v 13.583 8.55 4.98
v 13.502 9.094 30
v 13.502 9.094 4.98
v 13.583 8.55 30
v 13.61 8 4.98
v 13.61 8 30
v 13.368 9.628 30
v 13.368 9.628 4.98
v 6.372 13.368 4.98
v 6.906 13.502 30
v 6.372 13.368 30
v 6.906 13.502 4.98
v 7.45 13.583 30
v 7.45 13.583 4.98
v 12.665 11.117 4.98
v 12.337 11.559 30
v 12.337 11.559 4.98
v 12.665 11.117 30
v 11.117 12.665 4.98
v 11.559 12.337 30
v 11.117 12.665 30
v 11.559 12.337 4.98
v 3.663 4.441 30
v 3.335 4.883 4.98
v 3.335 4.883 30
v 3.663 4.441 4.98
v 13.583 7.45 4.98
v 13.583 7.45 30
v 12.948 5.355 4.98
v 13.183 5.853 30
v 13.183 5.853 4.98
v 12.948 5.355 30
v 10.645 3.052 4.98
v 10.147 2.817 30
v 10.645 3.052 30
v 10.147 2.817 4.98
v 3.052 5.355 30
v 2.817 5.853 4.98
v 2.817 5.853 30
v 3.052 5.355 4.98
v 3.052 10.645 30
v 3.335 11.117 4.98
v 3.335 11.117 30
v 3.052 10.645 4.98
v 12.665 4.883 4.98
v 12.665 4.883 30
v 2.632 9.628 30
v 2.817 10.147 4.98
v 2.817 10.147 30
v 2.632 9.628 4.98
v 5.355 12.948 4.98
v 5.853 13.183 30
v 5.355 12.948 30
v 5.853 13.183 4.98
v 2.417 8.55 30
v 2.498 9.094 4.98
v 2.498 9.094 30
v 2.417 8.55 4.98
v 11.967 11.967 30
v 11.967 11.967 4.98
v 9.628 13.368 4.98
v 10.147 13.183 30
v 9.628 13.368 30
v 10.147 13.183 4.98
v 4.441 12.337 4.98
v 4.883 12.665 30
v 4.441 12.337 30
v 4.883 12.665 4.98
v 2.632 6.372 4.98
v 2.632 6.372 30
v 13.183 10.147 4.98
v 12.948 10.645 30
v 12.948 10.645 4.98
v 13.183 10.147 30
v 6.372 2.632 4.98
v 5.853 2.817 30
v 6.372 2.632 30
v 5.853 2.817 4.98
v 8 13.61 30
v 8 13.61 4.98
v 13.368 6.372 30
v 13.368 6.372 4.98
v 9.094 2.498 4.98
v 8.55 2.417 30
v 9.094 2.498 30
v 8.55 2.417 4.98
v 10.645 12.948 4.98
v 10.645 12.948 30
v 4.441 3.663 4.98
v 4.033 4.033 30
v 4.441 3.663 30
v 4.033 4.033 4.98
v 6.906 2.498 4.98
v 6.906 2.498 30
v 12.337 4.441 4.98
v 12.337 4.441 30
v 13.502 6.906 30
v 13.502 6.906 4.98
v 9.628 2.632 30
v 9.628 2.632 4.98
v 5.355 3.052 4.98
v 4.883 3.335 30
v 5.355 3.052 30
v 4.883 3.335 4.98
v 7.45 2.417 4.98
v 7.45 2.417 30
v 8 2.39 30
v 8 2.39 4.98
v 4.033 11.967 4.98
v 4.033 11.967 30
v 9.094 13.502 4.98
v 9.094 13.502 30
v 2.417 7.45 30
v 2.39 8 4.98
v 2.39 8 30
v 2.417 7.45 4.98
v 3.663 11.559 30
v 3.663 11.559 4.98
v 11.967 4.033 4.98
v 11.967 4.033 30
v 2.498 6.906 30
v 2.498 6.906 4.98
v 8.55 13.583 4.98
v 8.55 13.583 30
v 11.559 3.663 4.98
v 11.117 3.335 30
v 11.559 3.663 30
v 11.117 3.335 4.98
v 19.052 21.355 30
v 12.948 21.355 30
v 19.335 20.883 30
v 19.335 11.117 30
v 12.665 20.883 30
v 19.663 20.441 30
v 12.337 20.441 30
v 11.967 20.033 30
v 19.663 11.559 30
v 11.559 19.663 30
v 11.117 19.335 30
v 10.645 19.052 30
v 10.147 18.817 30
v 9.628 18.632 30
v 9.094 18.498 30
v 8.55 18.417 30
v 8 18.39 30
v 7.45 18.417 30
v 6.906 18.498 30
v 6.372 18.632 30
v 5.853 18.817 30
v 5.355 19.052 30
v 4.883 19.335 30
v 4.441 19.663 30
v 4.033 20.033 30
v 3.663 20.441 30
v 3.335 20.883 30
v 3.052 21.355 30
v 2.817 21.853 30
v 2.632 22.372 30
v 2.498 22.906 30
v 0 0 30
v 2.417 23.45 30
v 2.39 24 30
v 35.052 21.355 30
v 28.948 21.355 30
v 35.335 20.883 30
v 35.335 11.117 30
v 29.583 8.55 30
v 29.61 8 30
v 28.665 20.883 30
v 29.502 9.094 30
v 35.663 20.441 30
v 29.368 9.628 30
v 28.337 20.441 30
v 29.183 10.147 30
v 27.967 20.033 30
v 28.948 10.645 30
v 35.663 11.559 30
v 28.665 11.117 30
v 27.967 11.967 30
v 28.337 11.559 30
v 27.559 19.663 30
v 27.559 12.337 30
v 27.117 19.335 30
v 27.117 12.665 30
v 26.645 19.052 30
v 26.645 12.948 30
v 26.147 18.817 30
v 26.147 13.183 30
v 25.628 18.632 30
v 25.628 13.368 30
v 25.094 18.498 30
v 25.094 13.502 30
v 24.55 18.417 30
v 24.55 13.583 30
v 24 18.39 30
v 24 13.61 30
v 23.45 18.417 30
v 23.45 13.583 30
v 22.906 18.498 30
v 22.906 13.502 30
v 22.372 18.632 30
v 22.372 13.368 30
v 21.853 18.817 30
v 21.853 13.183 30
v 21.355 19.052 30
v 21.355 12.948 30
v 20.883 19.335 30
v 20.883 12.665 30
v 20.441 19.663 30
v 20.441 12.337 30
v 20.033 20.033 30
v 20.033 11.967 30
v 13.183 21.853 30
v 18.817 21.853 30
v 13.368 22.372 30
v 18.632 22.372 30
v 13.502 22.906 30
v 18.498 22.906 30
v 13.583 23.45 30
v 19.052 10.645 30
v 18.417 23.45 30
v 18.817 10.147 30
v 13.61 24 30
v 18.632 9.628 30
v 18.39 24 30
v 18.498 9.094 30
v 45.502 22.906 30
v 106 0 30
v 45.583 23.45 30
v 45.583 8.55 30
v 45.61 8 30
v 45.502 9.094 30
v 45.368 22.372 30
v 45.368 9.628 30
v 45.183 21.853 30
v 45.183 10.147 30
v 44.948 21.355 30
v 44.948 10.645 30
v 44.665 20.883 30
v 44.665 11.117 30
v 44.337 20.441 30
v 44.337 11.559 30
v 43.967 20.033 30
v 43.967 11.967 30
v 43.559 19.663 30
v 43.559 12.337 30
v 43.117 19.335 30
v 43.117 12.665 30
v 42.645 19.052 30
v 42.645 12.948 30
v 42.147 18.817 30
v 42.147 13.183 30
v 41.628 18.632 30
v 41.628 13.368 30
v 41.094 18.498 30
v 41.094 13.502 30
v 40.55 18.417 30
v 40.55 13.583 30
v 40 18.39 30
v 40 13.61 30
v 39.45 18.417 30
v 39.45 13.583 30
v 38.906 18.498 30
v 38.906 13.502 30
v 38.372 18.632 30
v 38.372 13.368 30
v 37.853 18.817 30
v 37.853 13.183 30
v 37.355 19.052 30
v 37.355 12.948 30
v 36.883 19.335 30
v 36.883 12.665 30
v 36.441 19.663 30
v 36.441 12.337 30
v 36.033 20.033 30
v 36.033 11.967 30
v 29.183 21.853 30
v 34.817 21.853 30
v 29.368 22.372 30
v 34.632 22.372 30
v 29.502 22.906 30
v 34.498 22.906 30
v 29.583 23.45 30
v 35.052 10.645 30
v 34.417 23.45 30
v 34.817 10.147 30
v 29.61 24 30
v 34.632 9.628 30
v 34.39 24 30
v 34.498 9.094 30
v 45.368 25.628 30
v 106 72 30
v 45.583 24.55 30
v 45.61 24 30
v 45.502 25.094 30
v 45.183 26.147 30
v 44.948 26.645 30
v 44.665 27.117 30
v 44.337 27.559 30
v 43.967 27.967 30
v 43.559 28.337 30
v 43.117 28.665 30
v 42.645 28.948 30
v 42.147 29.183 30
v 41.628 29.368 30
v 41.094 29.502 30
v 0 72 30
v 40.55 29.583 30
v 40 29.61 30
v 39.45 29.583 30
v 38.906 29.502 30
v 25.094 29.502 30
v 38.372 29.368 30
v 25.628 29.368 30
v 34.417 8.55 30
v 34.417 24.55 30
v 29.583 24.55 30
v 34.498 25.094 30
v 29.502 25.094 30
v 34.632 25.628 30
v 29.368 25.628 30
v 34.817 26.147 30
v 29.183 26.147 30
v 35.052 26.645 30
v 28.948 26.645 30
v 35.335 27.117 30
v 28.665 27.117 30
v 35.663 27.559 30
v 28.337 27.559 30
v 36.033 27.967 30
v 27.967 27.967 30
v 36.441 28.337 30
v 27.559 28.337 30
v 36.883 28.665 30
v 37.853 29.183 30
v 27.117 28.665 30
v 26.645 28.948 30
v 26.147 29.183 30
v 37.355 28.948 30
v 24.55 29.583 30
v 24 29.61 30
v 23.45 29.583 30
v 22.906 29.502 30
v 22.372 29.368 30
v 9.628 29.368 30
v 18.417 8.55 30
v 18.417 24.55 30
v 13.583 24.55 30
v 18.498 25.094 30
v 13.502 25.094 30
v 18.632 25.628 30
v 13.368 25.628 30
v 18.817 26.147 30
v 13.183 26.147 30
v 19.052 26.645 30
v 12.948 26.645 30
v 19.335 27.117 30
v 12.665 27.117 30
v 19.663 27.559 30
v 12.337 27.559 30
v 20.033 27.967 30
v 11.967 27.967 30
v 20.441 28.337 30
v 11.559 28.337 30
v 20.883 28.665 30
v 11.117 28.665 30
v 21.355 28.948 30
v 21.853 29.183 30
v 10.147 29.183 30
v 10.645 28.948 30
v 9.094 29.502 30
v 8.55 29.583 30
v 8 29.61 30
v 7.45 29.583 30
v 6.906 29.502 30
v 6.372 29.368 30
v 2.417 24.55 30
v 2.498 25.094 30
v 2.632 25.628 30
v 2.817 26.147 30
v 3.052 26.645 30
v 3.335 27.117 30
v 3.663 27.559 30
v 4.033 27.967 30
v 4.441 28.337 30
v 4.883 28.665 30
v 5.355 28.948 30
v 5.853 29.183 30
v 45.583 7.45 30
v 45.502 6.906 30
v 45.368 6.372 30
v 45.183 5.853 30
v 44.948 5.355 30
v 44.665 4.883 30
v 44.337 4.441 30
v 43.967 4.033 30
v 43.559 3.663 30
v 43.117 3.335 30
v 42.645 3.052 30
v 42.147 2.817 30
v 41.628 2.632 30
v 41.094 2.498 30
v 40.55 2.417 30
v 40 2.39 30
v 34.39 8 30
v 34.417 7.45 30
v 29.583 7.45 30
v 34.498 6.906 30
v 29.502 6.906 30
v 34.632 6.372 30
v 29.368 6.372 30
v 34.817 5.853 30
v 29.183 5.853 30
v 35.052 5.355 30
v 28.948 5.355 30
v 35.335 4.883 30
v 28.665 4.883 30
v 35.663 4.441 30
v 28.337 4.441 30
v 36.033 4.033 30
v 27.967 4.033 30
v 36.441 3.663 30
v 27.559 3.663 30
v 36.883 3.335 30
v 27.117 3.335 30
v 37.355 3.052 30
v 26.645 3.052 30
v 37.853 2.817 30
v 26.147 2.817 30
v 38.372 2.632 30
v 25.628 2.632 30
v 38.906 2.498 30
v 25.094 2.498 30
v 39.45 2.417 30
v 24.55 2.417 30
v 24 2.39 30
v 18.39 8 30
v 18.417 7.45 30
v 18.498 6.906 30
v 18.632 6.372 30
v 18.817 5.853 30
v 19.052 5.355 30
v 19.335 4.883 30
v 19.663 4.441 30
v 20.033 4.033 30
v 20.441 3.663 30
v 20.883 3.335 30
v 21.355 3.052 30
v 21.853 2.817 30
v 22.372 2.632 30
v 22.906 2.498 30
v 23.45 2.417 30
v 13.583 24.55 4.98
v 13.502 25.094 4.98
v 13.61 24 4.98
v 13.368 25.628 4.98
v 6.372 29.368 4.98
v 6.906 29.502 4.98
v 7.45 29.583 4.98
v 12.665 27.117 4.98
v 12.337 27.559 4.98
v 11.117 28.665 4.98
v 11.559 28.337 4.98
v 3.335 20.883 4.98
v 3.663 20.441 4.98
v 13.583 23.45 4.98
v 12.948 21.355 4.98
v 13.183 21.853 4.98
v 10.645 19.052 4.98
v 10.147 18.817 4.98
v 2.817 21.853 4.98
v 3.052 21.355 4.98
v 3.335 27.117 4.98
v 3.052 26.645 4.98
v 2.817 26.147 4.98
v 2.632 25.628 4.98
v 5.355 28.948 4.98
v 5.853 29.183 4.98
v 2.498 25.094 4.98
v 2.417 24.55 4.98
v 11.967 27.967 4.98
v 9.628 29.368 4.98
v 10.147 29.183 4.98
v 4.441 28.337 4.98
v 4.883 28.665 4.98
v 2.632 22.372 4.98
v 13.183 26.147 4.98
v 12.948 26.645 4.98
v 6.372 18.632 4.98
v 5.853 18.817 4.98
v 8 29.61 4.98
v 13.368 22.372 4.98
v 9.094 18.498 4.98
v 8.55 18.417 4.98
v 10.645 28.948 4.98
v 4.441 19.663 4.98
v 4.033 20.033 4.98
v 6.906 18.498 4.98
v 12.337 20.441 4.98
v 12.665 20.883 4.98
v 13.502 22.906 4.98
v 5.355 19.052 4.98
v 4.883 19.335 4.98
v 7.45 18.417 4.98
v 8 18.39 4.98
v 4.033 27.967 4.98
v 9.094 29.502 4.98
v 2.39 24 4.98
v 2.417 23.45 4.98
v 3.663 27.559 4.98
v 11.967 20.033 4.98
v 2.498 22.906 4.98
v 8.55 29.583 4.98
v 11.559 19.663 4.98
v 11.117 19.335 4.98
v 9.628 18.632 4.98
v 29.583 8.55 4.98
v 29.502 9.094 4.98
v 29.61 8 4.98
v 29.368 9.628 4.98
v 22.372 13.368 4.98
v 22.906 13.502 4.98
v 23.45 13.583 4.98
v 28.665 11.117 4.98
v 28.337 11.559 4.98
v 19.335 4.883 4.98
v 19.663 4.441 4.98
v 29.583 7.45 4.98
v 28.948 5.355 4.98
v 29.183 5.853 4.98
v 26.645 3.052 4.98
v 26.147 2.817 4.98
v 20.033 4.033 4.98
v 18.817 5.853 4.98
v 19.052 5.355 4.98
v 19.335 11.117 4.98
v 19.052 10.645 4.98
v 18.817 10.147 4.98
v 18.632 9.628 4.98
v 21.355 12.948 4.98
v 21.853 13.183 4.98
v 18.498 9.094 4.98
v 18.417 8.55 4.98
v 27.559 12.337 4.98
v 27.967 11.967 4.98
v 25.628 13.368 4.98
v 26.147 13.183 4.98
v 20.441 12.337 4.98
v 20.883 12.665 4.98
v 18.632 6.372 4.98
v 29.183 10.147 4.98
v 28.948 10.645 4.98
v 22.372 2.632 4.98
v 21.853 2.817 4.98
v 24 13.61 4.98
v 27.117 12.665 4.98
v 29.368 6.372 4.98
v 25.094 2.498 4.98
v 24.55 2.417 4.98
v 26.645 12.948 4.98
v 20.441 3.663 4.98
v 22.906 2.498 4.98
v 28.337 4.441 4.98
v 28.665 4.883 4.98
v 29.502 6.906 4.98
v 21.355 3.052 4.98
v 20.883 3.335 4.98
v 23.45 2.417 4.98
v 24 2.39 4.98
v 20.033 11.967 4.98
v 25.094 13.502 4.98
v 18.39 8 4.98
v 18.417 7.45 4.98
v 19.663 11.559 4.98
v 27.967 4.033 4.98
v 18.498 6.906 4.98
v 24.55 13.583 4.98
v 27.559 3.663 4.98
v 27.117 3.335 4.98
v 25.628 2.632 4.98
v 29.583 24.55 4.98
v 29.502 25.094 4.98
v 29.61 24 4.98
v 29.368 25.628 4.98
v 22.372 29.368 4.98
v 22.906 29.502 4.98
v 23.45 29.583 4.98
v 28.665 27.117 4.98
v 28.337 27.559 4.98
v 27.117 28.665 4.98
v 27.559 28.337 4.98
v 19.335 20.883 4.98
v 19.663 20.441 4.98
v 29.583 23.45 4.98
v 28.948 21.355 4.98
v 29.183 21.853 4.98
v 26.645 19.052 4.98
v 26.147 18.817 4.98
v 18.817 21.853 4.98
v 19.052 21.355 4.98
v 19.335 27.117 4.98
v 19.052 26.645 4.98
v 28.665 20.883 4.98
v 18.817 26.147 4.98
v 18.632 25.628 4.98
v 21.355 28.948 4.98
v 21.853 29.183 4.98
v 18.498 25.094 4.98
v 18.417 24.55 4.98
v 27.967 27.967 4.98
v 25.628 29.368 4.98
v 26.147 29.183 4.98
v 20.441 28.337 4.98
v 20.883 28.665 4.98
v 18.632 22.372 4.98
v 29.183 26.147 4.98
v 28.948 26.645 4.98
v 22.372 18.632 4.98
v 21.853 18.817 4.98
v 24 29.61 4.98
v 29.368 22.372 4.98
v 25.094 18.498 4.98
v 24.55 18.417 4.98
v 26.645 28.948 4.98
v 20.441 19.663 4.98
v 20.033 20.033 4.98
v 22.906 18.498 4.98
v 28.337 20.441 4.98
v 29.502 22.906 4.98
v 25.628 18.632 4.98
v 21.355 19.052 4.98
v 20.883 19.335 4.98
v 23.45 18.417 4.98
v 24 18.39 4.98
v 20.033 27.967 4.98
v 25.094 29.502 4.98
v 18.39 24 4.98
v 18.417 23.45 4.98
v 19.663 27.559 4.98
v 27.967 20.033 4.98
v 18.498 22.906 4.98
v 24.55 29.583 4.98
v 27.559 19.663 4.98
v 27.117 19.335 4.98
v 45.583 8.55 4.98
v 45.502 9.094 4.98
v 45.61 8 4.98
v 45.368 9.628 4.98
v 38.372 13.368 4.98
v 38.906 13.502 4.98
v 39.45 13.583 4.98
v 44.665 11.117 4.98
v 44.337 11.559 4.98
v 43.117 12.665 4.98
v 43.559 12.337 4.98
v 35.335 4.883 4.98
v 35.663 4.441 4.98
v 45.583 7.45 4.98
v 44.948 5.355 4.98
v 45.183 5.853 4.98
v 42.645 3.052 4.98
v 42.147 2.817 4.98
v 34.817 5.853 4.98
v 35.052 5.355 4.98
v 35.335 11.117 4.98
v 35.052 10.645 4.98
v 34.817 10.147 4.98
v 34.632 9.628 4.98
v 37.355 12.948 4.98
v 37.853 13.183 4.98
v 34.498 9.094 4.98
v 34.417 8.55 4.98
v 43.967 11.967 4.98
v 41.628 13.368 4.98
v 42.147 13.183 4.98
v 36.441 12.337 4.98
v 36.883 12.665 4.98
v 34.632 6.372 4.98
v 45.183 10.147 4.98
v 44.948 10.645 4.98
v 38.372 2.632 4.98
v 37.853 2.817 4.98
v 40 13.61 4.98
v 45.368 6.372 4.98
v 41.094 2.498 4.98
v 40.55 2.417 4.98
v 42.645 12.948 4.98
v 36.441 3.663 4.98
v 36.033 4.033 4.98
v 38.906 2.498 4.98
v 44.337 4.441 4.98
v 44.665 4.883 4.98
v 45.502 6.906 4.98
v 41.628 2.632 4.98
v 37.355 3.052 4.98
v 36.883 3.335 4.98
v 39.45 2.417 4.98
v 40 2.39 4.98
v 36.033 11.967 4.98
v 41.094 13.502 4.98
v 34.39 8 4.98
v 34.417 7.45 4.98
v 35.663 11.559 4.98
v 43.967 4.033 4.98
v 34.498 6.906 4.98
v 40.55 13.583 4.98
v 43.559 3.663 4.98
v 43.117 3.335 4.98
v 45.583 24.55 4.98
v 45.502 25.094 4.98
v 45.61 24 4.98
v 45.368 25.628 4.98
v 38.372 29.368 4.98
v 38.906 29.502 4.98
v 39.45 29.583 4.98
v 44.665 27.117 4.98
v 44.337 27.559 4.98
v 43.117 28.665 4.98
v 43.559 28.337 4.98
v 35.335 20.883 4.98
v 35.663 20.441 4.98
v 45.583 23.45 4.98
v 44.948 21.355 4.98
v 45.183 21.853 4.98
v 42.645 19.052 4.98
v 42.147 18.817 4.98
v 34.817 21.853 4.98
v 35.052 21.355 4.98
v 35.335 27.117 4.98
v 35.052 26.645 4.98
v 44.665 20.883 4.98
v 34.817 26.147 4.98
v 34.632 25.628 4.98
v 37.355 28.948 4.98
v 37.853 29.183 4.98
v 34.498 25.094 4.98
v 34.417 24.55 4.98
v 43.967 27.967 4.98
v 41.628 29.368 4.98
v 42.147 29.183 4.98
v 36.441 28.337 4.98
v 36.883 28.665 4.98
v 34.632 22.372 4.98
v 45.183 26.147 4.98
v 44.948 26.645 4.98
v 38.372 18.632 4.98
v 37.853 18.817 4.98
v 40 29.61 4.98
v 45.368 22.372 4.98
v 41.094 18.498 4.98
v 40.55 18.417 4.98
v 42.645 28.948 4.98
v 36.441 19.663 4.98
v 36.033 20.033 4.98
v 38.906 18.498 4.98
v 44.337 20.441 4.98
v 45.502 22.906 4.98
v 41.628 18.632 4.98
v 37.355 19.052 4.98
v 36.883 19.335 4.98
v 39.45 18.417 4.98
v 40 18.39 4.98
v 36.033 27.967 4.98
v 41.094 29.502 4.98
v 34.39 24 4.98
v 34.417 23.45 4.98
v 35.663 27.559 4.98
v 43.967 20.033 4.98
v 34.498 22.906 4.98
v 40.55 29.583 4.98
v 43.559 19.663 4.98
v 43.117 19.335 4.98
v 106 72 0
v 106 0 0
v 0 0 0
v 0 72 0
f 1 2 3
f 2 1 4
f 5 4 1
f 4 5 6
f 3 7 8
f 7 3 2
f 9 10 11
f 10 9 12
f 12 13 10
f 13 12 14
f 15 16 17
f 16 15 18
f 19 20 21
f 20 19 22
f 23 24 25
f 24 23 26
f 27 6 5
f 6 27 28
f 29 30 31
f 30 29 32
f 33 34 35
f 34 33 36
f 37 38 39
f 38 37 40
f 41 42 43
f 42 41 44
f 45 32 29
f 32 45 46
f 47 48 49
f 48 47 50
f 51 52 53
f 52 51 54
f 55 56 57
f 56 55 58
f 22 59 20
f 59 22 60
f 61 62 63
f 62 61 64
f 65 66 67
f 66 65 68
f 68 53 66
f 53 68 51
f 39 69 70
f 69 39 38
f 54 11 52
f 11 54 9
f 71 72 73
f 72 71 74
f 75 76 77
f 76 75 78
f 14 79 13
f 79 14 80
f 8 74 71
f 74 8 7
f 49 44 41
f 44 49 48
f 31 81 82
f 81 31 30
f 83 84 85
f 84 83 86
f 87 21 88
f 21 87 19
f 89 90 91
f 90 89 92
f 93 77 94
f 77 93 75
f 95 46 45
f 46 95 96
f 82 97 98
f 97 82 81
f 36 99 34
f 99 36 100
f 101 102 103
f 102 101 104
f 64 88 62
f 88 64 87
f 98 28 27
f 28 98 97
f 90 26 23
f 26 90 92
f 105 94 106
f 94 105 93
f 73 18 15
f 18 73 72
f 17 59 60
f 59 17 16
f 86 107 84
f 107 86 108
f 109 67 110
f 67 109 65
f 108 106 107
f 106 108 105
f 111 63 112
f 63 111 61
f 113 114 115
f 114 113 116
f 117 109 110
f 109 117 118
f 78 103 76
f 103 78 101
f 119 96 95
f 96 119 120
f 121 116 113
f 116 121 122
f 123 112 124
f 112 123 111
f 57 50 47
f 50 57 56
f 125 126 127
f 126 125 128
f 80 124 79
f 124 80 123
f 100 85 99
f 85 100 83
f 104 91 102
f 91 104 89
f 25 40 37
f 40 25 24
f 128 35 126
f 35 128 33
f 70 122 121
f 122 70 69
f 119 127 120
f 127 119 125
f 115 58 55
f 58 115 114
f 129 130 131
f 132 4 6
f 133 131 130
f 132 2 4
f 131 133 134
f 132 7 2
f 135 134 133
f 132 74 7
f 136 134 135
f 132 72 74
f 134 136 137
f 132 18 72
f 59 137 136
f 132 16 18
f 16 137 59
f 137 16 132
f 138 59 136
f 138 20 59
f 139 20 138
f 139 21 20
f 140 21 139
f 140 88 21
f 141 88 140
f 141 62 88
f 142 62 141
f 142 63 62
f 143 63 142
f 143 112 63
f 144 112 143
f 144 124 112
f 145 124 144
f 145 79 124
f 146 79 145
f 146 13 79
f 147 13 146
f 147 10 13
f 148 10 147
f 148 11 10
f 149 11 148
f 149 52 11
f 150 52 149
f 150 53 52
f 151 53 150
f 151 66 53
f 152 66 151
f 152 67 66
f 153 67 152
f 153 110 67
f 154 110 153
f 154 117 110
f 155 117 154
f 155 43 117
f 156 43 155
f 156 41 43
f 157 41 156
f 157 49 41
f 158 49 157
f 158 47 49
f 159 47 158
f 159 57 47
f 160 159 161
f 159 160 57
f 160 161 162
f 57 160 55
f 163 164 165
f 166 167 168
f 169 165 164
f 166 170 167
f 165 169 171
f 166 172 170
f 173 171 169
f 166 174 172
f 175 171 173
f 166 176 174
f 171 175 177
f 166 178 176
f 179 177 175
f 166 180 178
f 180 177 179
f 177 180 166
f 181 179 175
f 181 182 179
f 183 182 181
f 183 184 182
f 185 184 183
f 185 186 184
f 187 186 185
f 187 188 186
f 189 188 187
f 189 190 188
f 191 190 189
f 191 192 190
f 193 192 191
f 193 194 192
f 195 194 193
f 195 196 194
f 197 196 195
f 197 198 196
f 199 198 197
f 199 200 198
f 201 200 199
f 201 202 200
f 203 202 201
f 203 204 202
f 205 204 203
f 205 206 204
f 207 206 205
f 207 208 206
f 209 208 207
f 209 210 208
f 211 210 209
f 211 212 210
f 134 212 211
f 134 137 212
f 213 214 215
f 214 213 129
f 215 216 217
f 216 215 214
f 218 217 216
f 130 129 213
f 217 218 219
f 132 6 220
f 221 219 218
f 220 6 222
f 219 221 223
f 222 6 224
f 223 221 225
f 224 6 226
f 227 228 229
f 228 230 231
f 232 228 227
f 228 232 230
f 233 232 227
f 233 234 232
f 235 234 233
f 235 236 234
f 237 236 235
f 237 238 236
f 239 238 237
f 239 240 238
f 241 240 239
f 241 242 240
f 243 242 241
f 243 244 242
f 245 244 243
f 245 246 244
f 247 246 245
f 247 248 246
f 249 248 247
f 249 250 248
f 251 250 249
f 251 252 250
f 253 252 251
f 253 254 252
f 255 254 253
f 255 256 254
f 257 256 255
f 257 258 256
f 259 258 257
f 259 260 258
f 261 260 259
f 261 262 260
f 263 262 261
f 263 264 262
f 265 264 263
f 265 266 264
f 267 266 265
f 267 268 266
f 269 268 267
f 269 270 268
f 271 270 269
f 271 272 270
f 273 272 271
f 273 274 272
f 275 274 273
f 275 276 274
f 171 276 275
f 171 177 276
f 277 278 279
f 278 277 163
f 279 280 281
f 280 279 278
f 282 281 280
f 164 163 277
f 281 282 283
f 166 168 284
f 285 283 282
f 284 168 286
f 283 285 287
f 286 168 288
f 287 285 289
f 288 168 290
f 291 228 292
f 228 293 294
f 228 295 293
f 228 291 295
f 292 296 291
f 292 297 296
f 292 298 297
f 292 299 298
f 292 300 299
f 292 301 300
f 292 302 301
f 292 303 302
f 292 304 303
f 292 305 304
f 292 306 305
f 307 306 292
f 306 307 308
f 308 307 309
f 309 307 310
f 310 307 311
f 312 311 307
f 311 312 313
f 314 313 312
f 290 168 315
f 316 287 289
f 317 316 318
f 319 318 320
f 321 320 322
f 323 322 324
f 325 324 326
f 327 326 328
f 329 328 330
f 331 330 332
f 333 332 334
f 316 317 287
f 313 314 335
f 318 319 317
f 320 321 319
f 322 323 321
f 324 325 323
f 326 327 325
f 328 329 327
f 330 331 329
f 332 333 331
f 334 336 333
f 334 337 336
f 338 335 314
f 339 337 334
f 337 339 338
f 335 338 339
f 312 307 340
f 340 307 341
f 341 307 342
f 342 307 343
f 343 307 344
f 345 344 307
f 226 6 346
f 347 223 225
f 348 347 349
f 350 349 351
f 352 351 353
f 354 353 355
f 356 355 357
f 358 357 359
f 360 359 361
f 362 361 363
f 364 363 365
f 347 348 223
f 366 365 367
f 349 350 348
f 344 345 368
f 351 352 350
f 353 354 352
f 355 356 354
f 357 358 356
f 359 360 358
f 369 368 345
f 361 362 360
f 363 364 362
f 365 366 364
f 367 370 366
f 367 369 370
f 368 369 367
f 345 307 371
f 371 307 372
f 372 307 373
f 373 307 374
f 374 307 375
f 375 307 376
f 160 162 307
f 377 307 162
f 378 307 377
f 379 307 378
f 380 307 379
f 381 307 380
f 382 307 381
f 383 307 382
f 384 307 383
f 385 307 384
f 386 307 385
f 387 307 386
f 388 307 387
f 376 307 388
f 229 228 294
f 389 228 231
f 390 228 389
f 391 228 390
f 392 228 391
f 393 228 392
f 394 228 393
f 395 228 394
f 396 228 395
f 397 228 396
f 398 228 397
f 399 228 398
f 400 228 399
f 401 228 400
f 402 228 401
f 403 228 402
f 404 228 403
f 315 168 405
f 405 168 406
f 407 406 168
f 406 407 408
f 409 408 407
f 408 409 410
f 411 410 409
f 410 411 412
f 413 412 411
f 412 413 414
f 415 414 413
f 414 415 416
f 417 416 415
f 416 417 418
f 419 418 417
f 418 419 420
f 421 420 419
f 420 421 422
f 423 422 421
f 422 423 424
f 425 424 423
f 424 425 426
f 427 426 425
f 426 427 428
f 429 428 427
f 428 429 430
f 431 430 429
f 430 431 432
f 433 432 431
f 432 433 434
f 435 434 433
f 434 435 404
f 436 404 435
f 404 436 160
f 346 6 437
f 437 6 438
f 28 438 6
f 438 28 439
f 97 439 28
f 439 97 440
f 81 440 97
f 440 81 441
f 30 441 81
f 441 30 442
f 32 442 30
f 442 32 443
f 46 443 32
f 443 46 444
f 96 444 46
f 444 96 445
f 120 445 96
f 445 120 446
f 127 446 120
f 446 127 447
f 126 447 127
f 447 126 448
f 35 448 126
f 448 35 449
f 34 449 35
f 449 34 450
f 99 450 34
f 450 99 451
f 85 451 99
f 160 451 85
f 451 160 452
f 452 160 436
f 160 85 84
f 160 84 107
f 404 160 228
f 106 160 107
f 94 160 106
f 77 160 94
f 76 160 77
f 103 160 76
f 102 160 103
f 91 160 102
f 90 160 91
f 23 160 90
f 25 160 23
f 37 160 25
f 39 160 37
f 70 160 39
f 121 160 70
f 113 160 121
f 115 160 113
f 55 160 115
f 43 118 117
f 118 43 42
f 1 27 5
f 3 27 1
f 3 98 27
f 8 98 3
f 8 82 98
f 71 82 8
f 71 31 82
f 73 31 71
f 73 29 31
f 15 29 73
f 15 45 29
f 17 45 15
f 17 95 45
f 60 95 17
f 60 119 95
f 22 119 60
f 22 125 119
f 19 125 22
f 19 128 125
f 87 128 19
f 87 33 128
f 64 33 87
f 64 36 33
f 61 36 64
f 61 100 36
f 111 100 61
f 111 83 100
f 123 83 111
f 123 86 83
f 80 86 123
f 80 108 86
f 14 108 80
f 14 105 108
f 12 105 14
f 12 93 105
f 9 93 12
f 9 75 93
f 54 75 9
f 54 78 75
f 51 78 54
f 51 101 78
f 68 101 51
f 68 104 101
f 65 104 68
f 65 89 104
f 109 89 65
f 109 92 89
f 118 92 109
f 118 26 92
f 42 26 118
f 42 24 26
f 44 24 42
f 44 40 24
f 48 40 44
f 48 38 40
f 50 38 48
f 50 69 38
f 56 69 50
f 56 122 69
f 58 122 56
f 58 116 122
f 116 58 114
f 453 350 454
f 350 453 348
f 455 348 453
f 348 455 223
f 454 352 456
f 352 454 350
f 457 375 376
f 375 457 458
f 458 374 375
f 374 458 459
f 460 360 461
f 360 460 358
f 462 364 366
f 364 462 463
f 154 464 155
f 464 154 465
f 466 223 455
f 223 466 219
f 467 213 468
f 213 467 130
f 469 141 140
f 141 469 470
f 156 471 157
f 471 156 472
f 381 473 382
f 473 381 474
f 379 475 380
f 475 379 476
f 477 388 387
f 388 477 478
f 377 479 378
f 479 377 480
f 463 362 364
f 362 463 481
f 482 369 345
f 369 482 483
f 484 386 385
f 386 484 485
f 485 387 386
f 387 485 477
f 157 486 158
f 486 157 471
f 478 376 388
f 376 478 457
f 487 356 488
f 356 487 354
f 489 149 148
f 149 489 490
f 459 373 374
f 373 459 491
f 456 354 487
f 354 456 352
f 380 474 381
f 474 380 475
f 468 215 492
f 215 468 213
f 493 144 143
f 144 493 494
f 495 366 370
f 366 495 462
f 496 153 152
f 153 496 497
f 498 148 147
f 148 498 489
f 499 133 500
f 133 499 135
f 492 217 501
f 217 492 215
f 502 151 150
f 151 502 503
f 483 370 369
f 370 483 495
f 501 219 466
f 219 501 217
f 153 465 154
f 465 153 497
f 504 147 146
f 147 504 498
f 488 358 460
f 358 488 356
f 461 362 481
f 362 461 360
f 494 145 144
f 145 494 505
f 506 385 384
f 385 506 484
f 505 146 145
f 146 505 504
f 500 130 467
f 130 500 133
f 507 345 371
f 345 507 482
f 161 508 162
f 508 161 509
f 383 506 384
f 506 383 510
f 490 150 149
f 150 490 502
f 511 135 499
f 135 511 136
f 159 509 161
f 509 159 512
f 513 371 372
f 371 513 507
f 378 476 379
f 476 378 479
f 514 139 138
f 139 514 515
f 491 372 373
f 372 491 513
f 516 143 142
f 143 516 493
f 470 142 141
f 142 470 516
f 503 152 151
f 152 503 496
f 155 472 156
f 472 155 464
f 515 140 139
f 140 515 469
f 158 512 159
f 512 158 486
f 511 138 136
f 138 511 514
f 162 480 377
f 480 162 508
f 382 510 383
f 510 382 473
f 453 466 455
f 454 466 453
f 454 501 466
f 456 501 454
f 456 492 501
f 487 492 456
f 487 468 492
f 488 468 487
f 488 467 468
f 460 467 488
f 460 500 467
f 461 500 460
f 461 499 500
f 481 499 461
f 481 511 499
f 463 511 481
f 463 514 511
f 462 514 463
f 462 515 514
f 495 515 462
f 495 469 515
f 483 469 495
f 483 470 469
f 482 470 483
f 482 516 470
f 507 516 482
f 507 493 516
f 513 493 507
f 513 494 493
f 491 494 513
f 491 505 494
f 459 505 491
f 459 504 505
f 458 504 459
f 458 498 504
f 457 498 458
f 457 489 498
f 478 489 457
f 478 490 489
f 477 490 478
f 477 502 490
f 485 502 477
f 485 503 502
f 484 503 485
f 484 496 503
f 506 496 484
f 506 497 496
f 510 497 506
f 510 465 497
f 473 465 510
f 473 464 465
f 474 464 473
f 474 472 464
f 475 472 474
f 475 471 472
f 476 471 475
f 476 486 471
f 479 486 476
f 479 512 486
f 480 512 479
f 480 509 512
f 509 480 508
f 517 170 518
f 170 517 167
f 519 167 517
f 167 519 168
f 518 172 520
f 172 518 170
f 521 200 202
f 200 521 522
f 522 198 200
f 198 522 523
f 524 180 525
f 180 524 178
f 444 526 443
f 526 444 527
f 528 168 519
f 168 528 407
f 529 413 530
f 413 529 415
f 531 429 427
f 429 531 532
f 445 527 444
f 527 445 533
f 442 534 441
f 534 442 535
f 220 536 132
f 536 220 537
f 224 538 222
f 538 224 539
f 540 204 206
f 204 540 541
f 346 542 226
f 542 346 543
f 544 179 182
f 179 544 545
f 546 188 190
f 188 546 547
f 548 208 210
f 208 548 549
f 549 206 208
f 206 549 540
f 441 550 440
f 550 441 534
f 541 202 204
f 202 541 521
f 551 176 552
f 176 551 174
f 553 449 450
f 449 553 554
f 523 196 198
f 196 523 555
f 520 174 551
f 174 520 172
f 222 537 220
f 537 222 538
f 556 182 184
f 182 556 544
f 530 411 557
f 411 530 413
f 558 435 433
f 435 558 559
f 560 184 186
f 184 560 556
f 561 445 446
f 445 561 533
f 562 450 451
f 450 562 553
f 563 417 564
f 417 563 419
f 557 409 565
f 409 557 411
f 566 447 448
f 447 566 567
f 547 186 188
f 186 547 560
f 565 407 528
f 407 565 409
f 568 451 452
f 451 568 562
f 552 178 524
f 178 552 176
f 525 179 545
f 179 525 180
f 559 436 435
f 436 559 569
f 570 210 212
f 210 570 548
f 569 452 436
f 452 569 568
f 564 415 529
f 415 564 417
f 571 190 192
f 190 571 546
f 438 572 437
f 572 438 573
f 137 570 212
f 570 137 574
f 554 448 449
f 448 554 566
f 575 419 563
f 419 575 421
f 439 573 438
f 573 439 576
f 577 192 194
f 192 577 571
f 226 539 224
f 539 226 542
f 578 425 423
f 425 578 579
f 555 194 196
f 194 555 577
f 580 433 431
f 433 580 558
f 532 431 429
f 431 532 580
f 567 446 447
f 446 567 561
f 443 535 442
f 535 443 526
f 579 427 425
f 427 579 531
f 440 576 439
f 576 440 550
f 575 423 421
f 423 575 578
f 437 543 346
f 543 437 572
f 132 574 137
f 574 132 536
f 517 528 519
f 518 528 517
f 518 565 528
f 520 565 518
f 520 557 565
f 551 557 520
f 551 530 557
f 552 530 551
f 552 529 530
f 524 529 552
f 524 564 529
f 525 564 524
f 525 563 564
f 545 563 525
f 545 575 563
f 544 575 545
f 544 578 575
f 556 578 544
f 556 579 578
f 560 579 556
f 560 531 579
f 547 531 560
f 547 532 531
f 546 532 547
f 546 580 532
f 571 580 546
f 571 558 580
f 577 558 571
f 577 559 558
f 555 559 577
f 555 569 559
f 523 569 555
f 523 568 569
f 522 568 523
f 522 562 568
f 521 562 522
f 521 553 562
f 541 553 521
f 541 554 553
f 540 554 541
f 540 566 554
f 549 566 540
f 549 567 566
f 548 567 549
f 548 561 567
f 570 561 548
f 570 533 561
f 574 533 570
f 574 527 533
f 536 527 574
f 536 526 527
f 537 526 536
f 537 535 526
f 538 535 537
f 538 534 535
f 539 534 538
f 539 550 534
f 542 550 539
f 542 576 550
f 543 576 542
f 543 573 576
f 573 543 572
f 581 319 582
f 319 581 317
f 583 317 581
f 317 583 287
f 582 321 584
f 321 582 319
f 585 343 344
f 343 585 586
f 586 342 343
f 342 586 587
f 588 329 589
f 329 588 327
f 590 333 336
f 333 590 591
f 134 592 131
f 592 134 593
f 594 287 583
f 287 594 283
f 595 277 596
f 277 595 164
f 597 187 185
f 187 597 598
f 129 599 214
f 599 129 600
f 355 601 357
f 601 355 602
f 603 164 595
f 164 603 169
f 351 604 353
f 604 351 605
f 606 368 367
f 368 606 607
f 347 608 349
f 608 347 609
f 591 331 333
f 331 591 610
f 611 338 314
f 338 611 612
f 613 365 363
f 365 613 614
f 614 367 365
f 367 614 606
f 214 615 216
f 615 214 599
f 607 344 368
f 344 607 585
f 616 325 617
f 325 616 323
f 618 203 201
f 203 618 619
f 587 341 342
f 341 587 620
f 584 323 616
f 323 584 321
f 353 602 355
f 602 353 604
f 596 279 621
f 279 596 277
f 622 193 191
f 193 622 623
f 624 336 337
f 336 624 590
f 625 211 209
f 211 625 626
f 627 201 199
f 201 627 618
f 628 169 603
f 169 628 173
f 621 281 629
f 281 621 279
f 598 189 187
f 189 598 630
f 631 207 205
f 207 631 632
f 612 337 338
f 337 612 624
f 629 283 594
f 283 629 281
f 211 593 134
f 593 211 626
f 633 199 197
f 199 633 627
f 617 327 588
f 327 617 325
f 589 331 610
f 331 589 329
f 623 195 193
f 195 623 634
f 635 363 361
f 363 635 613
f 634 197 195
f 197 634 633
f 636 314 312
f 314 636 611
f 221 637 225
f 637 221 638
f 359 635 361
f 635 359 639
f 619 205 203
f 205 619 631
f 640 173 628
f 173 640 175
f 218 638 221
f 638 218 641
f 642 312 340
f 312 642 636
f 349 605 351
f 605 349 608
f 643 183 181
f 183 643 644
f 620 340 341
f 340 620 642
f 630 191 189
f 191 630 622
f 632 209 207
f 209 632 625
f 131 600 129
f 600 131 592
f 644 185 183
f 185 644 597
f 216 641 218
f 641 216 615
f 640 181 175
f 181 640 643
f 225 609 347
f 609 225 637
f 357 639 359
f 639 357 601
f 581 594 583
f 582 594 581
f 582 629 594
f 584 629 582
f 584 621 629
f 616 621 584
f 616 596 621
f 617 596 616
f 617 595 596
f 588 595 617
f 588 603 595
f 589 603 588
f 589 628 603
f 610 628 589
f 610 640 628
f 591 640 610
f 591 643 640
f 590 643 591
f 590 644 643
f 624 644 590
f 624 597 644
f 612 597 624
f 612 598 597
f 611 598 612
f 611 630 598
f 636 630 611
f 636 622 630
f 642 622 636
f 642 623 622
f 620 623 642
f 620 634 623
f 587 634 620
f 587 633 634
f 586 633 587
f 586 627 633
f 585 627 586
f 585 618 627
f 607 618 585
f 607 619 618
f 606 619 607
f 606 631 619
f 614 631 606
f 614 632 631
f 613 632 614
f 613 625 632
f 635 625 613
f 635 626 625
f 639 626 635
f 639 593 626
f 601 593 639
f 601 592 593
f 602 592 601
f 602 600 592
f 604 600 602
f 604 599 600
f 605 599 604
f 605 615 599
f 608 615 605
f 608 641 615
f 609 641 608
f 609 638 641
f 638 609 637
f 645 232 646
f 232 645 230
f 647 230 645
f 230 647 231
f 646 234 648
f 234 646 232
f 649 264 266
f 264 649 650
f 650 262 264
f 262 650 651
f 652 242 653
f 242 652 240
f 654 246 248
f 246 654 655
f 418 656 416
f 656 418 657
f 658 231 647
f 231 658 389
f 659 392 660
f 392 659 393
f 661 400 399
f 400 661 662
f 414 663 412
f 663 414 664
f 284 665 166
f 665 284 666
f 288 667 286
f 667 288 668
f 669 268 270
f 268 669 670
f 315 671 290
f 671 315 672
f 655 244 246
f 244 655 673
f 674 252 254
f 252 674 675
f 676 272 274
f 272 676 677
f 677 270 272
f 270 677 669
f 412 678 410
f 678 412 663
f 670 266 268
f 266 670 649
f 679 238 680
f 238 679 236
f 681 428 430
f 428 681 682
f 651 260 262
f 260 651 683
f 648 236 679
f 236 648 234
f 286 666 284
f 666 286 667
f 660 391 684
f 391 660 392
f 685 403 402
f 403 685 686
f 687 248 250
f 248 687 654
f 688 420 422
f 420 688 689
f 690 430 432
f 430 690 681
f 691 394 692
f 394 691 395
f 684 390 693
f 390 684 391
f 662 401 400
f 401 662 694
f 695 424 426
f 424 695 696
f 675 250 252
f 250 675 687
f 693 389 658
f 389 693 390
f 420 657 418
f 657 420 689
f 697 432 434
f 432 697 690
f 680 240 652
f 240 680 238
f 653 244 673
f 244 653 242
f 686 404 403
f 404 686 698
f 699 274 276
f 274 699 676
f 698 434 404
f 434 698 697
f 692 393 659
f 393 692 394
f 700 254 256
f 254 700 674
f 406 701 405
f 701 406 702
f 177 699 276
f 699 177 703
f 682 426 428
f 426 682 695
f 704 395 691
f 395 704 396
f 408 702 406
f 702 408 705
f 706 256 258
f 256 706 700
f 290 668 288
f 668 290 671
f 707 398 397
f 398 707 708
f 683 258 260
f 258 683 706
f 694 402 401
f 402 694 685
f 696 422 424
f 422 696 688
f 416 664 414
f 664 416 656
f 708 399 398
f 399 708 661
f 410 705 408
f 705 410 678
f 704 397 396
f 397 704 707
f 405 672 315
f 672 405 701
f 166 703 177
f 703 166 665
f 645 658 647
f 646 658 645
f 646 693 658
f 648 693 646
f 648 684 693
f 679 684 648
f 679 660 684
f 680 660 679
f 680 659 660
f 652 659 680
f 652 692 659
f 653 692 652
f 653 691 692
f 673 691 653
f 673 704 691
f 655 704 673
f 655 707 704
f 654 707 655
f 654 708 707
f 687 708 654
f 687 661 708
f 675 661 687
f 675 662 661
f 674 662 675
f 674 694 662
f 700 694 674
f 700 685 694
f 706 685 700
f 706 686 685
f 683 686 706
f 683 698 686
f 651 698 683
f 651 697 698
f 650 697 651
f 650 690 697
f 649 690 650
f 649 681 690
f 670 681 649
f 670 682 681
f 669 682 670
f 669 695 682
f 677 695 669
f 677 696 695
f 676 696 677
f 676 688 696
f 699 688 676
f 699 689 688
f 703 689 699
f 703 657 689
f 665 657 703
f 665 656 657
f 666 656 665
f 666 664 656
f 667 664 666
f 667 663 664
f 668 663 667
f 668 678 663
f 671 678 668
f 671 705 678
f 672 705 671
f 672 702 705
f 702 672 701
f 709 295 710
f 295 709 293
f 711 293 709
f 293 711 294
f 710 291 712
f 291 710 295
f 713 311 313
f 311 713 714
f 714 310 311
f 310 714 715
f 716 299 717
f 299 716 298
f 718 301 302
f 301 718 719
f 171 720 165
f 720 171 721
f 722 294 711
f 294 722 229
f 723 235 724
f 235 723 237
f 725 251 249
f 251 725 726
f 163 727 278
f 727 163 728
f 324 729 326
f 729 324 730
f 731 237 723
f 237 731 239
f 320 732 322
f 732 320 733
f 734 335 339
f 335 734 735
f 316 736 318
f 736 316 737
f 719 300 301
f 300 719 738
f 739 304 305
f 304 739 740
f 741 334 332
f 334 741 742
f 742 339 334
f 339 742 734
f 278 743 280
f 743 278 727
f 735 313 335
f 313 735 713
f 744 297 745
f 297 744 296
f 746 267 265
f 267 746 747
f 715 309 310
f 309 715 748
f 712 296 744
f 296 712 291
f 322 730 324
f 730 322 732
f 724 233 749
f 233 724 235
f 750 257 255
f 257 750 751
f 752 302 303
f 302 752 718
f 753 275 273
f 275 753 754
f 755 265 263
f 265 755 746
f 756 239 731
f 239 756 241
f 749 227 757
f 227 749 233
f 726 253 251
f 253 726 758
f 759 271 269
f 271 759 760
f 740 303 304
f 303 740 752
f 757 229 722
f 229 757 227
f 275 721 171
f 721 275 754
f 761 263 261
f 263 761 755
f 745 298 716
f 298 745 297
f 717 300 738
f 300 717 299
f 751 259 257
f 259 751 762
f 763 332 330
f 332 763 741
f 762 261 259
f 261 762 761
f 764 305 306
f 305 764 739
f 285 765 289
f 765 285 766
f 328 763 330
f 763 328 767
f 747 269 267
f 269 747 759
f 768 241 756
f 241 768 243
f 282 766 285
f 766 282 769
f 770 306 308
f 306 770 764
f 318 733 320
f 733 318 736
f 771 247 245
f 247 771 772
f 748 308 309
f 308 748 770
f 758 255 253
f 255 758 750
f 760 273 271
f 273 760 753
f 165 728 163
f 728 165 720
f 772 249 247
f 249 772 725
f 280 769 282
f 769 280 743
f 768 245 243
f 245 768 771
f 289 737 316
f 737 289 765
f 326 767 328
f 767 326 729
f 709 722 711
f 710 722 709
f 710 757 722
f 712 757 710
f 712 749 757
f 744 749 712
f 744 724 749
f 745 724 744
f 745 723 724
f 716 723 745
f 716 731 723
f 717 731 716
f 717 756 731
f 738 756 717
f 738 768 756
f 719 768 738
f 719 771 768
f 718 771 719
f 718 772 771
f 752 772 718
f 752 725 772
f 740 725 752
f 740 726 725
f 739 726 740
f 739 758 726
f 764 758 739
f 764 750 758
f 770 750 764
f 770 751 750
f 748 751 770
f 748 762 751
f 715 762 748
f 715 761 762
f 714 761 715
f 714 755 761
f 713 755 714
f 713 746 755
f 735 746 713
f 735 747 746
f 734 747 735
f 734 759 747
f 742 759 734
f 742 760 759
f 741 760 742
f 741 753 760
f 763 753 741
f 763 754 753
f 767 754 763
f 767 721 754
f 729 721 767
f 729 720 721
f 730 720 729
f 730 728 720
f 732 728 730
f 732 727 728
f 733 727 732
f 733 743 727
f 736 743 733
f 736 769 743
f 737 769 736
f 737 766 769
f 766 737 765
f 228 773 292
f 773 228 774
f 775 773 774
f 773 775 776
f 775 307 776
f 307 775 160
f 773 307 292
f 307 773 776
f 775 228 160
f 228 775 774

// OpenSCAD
// Dimensions
BLOCK_X = 106;
BLOCK_Y = 72;
BLOCK_Z = 30;

// Hole grid parameters
NUM_ROWS = 4; // Along Y
NUM_COLS = 6; // Along X
HOLE_PITCH_X = 16;
HOLE_PITCH_Y = 16;
HOLE_DIAM = 11.2;
HOLE_DEPTH = 25;

// Derived dimensions
BLOCK_HALF_X = BLOCK_X / 2;
BLOCK_HALF_Y = BLOCK_Y / 2;

// Calculate grid bounds to center on the block
// Total width of grid = (N-1) * pitch
GRID_W_X = (NUM_COLS - 1) * HOLE_PITCH_X;
GRID_W_Y = (NUM_ROWS - 1) * HOLE_PITCH_Y;

// Start positions for the grid relative to center (0,0)
GRID_START_X = -GRID_W_X / 2;
GRID_START_Y = -GRID_W_Y / 2;

// Hole geometry
// The block rests on Z=0 and is BLOCK_Z tall.
// Holes are 25 mm deep, open at the top (Z=30).
// They end at Z = 30 - 25 = 5 mm.
// We cut from Z=30 down to Z=5.
// To ensure clean boolean operations, we extend the cut slightly past the bottom.
HOLE_CUT_Z_BOTTOM = 5 - 0.01; 
HOLE_CUT_HEIGHT = 30 - HOLE_CUT_Z_BOTTOM;

// Hole radius
HOLE_R = HOLE_DIAM / 2;

module Hole() {
    // Use a cylinder slightly larger than the diameter to ensure the hole is at least the target size
    // and to avoid faceting issues with low $fn.
    // Extending past the bottom face by 0.01mm as per rules.
    // The cylinder is centered=false, so it builds from z=0 upwards.
    // We position it so its top is at Z=30 and bottom extends past Z=5.
    cylinder(h = HOLE_CUT_HEIGHT + 0.01, r = HOLE_R + 0.01, center = false, $fn = 64);
}

module Block() {
    // Centered in X and Y, resting on Z=0
    cube([BLOCK_X, BLOCK_Y, BLOCK_Z], center = false);
}

module Rack() {
    // Base block
    difference() {
        Block();
        
        // Drill holes
        for (i = [0 : NUM_COLS - 1]) {
            for (j = [0 : NUM_ROWS - 1]) {
                x_pos = GRID_START_X + i * HOLE_PITCH_X;
                y_pos = GRID_START_Y + j * HOLE_PITCH_Y;
                
                translate([x_pos, y_pos, 0]) {
                    // Position the hole cylinder so its top is at Z=30 (top of block)
                    // The cylinder height is HOLE_CUT_HEIGHT + 0.01
                    // We want the top of the cylinder to be at Z=30.
                    // So the bottom of the cylinder (local z=0) should be at Z = 30 - (HOLE_CUT_HEIGHT + 0.01)
                    // However, simpler: Place the cylinder such that it covers the range [5-0.01, 30].
                    // Cylinder height is HOLE_CUT_HEIGHT + 0.01.
                    // If we place the base at Z = 30 - (HOLE_CUT_HEIGHT + 0.01), the top will be at Z=30.
                    // Let's calculate the base Z position.
                    base_z = 30 - (HOLE_CUT_HEIGHT + 0.01);
                    
                    translate([0, 0, base_z]) {
                        Hole();
                    }
                }
            }
        }
    }
}

Rack();
